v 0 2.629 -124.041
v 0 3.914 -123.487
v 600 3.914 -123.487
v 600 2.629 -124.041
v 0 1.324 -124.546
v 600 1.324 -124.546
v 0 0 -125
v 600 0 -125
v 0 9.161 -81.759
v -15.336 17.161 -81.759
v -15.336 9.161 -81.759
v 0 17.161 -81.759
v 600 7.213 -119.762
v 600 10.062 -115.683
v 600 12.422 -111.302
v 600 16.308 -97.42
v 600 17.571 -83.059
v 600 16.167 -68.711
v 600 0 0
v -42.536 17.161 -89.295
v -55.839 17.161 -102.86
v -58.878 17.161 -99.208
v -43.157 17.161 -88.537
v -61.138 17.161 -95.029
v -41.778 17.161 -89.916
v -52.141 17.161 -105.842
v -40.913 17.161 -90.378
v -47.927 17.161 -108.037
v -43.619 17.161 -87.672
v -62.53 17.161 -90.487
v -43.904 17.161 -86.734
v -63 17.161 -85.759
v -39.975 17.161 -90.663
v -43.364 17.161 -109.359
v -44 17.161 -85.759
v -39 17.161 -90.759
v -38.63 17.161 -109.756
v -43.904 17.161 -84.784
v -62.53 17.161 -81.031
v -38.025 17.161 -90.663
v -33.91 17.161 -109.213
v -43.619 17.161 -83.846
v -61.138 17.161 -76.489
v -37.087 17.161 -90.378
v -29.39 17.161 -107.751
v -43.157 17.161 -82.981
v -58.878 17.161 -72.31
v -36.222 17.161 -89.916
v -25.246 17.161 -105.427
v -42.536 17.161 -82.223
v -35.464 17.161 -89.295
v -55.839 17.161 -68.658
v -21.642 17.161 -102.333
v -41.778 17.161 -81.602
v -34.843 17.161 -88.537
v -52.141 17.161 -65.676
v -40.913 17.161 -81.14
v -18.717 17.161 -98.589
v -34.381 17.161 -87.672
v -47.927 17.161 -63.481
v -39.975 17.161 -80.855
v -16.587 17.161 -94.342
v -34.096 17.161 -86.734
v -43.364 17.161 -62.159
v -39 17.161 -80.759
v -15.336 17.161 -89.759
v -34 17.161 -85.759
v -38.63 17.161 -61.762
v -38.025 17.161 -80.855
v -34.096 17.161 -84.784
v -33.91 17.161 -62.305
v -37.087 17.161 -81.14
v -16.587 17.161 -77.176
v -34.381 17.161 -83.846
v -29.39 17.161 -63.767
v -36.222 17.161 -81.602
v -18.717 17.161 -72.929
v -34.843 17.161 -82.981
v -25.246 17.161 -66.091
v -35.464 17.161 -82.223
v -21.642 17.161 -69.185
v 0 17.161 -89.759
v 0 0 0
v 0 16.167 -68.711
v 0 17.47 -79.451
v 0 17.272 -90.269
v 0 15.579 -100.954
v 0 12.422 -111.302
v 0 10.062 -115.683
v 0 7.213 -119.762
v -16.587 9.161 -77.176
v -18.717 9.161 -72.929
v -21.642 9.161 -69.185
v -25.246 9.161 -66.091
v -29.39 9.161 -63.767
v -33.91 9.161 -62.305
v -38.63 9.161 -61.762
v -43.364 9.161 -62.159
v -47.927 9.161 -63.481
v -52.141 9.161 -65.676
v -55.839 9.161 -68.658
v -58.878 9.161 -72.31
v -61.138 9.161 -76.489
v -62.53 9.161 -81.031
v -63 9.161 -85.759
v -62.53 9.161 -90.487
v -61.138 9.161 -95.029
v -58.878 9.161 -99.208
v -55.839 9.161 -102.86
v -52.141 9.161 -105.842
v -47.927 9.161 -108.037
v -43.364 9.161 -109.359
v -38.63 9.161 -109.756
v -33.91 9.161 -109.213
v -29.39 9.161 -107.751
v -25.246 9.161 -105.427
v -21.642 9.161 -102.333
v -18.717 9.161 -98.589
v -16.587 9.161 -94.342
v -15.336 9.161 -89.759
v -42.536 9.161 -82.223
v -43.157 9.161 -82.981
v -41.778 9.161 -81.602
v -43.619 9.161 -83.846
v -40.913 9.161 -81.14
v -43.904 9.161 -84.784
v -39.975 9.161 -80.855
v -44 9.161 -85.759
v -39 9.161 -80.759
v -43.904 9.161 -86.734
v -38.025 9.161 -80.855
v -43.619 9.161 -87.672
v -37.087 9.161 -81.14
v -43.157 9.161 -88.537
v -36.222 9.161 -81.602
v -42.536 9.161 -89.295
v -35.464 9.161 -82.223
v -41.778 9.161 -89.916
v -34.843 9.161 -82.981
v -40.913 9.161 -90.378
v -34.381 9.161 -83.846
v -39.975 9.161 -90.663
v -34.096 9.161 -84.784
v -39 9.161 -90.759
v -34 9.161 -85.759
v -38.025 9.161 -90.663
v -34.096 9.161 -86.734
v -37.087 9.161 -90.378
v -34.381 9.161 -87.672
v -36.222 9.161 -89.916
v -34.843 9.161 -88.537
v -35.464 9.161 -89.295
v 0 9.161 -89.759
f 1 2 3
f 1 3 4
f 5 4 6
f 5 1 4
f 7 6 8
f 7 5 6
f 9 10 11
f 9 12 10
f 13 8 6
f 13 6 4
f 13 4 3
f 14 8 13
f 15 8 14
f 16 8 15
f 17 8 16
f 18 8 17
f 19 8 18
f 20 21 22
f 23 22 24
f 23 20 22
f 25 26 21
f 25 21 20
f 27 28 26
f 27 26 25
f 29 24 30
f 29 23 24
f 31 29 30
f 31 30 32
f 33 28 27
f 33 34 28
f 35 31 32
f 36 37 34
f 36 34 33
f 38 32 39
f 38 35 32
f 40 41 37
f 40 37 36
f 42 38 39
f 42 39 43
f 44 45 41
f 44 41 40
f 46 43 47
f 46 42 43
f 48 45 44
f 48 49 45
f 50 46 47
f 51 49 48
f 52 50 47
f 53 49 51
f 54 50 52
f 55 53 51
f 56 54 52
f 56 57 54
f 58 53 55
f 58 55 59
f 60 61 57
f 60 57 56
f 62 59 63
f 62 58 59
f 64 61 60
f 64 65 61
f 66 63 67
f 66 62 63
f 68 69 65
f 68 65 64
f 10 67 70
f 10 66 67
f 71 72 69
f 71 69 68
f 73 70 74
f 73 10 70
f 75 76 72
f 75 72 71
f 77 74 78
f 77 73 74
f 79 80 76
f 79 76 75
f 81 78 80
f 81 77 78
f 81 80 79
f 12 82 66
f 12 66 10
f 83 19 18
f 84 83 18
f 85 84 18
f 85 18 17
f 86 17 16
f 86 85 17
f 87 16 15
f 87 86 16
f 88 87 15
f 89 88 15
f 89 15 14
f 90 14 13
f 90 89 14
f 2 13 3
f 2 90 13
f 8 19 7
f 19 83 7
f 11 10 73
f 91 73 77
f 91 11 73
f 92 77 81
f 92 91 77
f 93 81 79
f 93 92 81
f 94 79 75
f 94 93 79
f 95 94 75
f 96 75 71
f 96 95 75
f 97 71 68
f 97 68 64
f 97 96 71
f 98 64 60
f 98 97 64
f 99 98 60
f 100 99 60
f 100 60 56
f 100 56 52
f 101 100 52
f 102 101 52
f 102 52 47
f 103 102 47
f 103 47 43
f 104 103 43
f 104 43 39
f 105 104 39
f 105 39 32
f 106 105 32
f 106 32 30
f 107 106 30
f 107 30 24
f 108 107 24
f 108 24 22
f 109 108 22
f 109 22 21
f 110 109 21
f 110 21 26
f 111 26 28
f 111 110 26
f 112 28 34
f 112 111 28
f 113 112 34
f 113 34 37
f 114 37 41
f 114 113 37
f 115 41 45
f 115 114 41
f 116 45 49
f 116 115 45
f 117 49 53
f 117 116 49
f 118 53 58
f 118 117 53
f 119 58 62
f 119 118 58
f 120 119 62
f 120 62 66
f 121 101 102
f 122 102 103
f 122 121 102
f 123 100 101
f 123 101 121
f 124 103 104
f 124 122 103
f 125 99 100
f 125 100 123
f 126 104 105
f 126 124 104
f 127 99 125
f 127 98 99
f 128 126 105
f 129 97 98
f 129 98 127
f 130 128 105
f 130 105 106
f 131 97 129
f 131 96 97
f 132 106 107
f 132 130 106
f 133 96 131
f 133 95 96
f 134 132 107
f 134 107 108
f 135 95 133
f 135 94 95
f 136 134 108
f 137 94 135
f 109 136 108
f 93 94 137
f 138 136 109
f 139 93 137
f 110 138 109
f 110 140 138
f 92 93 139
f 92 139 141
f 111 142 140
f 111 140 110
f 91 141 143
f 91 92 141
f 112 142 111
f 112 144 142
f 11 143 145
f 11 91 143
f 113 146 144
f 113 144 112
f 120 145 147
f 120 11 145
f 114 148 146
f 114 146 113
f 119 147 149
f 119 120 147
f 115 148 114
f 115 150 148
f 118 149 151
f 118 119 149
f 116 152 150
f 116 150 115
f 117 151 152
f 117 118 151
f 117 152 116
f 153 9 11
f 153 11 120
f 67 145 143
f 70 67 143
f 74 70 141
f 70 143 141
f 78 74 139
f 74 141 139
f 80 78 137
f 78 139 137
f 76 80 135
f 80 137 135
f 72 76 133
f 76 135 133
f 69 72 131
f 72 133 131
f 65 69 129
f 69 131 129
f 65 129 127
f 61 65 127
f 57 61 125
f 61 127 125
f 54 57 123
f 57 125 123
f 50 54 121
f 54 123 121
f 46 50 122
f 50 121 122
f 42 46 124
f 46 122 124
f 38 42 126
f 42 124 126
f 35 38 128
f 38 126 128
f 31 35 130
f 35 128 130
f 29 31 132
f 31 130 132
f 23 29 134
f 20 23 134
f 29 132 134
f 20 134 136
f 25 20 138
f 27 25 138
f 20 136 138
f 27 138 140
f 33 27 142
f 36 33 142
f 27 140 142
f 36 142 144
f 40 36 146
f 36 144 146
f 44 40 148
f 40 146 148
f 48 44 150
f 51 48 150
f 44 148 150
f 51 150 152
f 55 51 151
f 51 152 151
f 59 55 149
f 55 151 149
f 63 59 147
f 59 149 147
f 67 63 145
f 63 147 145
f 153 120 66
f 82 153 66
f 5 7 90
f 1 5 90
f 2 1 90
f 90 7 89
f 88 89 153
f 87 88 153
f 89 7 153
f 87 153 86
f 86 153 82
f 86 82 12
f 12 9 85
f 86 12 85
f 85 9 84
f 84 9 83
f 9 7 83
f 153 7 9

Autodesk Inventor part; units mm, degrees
ref_plane "YZ Plane" through (0, 0, 0) normal (1, 0, 0) x (0, 1, 0)
ref_plane "XZ Plane" through (0, 0, 0) normal (0, 1, 0) x (-1, 0, 0)
ref_plane "XY Plane" through (0, 0, 0) normal (0, 0, 1) x (1, 0, 0)
sketch "Sketch1" plane through (0, 0, 0) normal (1, 0, 0) x (0, 1, 0)
  line L0 (0, 0) -> (0, -125)
  arc A0 (0, -125) -> (3.9145, -123.4868) centre (-11.1642, -90.2991) ccw
  arc A1 (12.4221, -111.3025) -> (14.7058, -62.5) centre (-60.3675, -83.4416) ccw
  line L1 (0, 0) -> (16.1672, -68.711)
  arc A2 (3.9145, -123.4868) -> (12.4221, -111.3025) centre (-26.7088, -93.042) ccw
  dimension "d0" = 125
extrude "Extrusion1" add sketch "Sketch1" along normal blind 600 contours L1 A1 A2 A0 L0
sketch "Sketch2" plane through (0, 0, 0) normal (-1, 0, 0) x (0, 0, 1)
  line L0 (0, 0) -> (-125, 0) projected
  line L1 (-89.759, 17.1606) -> (-81.759, 17.1606)
  line L2 (-81.759, 17.1606) -> (-81.759, 9.1606)
  line L3 (-81.759, 9.1606) -> (-89.759, 9.1606)
  line L4 (-89.759, 9.1606) -> (-89.759, 17.1606)
  line L5 (-89.759, 17.1606) -> (-81.759, 9.1606) construction
  line L6 (-81.759, 17.1606) -> (-89.759, 9.1606) construction
  dimension "d3" = 8
  dimension "d4" = 8
extrude "Extrusion2" add sketch "Sketch2" along normal blind 48
sketch "Sketch3" plane through (0, 9.1606, -89.759) normal (0, -1, 0) x (1, 0, 0)
  point P0 (0, 89.759)
sketch "Sketch4" plane through (0, 0, 0) normal (0, 0.9734, 0.229) x (1, 0, 0)
  point P0 (0, 0)
sketch "Sketch5" plane through (0, 9.1606, -89.759) normal (0, -1, 0) x (1, 0, 0)
  line L0 (0, 0) -> (-48, 0) projected
  line L1 (0, 0) -> (-39, 0)
  line L2 (-39, 0) -> (-39, 4)
  line L3 (-39, 4) -> (0, 4)
  line L4 (0, 4) -> (0, 0)
  circle A0 centre (-39, 4) radius 24
  circle A1 centre (-39, 4) radius 5
  point P0 (0, 89.759)
  dimension "d7" = 39
  dimension "d8" = 4
  dimension "d9" = 48
  dimension "d12" = 10
extrude "Extrusion3" add sketch "Sketch5" against normal blind 8 contours A0 L3 A1 L0 | L0 A1 L3 A0 | A1 L0 | L0 L2 L3 A1 | L0 A1 L3 L2
sketch "Sketch6" plane through (0, 17.1606, -81.759) normal (0, 1, 0) x (1, 0, 0)
  point P0 (0, -81.759)
sketch "Sketch7" plane through (0, 9.1606, -89.759) normal (0, -1, 0) x (1, 0, 0)
  point P0 (0, 89.759)
sketch "Sketch8" plane through (0, 9.1606, -89.759) normal (0, -1, 0) x (1, 0, 0)
  line L0 (0, 8) -> (0, 0) projected
  line L1 (0, 0) -> (-39, 0)
  line L2 (-39, 0) -> (-39, 4)
  line L3 (-39, 4) -> (0, 4)
  line L4 (0, 4) -> (0, 0)
  circle A0 centre (-39, 4) radius 5
  point P0 (0, 89.759)
  dimension "d13" = 39
  dimension "d14" = 4
  dimension "d15" = 10
extrude "Extrusion4" cut sketch "Sketch8" against normal blind 8 contours A0 L1 L2 L3 | L3 L2 L1 A0
properties part number "R wing"
